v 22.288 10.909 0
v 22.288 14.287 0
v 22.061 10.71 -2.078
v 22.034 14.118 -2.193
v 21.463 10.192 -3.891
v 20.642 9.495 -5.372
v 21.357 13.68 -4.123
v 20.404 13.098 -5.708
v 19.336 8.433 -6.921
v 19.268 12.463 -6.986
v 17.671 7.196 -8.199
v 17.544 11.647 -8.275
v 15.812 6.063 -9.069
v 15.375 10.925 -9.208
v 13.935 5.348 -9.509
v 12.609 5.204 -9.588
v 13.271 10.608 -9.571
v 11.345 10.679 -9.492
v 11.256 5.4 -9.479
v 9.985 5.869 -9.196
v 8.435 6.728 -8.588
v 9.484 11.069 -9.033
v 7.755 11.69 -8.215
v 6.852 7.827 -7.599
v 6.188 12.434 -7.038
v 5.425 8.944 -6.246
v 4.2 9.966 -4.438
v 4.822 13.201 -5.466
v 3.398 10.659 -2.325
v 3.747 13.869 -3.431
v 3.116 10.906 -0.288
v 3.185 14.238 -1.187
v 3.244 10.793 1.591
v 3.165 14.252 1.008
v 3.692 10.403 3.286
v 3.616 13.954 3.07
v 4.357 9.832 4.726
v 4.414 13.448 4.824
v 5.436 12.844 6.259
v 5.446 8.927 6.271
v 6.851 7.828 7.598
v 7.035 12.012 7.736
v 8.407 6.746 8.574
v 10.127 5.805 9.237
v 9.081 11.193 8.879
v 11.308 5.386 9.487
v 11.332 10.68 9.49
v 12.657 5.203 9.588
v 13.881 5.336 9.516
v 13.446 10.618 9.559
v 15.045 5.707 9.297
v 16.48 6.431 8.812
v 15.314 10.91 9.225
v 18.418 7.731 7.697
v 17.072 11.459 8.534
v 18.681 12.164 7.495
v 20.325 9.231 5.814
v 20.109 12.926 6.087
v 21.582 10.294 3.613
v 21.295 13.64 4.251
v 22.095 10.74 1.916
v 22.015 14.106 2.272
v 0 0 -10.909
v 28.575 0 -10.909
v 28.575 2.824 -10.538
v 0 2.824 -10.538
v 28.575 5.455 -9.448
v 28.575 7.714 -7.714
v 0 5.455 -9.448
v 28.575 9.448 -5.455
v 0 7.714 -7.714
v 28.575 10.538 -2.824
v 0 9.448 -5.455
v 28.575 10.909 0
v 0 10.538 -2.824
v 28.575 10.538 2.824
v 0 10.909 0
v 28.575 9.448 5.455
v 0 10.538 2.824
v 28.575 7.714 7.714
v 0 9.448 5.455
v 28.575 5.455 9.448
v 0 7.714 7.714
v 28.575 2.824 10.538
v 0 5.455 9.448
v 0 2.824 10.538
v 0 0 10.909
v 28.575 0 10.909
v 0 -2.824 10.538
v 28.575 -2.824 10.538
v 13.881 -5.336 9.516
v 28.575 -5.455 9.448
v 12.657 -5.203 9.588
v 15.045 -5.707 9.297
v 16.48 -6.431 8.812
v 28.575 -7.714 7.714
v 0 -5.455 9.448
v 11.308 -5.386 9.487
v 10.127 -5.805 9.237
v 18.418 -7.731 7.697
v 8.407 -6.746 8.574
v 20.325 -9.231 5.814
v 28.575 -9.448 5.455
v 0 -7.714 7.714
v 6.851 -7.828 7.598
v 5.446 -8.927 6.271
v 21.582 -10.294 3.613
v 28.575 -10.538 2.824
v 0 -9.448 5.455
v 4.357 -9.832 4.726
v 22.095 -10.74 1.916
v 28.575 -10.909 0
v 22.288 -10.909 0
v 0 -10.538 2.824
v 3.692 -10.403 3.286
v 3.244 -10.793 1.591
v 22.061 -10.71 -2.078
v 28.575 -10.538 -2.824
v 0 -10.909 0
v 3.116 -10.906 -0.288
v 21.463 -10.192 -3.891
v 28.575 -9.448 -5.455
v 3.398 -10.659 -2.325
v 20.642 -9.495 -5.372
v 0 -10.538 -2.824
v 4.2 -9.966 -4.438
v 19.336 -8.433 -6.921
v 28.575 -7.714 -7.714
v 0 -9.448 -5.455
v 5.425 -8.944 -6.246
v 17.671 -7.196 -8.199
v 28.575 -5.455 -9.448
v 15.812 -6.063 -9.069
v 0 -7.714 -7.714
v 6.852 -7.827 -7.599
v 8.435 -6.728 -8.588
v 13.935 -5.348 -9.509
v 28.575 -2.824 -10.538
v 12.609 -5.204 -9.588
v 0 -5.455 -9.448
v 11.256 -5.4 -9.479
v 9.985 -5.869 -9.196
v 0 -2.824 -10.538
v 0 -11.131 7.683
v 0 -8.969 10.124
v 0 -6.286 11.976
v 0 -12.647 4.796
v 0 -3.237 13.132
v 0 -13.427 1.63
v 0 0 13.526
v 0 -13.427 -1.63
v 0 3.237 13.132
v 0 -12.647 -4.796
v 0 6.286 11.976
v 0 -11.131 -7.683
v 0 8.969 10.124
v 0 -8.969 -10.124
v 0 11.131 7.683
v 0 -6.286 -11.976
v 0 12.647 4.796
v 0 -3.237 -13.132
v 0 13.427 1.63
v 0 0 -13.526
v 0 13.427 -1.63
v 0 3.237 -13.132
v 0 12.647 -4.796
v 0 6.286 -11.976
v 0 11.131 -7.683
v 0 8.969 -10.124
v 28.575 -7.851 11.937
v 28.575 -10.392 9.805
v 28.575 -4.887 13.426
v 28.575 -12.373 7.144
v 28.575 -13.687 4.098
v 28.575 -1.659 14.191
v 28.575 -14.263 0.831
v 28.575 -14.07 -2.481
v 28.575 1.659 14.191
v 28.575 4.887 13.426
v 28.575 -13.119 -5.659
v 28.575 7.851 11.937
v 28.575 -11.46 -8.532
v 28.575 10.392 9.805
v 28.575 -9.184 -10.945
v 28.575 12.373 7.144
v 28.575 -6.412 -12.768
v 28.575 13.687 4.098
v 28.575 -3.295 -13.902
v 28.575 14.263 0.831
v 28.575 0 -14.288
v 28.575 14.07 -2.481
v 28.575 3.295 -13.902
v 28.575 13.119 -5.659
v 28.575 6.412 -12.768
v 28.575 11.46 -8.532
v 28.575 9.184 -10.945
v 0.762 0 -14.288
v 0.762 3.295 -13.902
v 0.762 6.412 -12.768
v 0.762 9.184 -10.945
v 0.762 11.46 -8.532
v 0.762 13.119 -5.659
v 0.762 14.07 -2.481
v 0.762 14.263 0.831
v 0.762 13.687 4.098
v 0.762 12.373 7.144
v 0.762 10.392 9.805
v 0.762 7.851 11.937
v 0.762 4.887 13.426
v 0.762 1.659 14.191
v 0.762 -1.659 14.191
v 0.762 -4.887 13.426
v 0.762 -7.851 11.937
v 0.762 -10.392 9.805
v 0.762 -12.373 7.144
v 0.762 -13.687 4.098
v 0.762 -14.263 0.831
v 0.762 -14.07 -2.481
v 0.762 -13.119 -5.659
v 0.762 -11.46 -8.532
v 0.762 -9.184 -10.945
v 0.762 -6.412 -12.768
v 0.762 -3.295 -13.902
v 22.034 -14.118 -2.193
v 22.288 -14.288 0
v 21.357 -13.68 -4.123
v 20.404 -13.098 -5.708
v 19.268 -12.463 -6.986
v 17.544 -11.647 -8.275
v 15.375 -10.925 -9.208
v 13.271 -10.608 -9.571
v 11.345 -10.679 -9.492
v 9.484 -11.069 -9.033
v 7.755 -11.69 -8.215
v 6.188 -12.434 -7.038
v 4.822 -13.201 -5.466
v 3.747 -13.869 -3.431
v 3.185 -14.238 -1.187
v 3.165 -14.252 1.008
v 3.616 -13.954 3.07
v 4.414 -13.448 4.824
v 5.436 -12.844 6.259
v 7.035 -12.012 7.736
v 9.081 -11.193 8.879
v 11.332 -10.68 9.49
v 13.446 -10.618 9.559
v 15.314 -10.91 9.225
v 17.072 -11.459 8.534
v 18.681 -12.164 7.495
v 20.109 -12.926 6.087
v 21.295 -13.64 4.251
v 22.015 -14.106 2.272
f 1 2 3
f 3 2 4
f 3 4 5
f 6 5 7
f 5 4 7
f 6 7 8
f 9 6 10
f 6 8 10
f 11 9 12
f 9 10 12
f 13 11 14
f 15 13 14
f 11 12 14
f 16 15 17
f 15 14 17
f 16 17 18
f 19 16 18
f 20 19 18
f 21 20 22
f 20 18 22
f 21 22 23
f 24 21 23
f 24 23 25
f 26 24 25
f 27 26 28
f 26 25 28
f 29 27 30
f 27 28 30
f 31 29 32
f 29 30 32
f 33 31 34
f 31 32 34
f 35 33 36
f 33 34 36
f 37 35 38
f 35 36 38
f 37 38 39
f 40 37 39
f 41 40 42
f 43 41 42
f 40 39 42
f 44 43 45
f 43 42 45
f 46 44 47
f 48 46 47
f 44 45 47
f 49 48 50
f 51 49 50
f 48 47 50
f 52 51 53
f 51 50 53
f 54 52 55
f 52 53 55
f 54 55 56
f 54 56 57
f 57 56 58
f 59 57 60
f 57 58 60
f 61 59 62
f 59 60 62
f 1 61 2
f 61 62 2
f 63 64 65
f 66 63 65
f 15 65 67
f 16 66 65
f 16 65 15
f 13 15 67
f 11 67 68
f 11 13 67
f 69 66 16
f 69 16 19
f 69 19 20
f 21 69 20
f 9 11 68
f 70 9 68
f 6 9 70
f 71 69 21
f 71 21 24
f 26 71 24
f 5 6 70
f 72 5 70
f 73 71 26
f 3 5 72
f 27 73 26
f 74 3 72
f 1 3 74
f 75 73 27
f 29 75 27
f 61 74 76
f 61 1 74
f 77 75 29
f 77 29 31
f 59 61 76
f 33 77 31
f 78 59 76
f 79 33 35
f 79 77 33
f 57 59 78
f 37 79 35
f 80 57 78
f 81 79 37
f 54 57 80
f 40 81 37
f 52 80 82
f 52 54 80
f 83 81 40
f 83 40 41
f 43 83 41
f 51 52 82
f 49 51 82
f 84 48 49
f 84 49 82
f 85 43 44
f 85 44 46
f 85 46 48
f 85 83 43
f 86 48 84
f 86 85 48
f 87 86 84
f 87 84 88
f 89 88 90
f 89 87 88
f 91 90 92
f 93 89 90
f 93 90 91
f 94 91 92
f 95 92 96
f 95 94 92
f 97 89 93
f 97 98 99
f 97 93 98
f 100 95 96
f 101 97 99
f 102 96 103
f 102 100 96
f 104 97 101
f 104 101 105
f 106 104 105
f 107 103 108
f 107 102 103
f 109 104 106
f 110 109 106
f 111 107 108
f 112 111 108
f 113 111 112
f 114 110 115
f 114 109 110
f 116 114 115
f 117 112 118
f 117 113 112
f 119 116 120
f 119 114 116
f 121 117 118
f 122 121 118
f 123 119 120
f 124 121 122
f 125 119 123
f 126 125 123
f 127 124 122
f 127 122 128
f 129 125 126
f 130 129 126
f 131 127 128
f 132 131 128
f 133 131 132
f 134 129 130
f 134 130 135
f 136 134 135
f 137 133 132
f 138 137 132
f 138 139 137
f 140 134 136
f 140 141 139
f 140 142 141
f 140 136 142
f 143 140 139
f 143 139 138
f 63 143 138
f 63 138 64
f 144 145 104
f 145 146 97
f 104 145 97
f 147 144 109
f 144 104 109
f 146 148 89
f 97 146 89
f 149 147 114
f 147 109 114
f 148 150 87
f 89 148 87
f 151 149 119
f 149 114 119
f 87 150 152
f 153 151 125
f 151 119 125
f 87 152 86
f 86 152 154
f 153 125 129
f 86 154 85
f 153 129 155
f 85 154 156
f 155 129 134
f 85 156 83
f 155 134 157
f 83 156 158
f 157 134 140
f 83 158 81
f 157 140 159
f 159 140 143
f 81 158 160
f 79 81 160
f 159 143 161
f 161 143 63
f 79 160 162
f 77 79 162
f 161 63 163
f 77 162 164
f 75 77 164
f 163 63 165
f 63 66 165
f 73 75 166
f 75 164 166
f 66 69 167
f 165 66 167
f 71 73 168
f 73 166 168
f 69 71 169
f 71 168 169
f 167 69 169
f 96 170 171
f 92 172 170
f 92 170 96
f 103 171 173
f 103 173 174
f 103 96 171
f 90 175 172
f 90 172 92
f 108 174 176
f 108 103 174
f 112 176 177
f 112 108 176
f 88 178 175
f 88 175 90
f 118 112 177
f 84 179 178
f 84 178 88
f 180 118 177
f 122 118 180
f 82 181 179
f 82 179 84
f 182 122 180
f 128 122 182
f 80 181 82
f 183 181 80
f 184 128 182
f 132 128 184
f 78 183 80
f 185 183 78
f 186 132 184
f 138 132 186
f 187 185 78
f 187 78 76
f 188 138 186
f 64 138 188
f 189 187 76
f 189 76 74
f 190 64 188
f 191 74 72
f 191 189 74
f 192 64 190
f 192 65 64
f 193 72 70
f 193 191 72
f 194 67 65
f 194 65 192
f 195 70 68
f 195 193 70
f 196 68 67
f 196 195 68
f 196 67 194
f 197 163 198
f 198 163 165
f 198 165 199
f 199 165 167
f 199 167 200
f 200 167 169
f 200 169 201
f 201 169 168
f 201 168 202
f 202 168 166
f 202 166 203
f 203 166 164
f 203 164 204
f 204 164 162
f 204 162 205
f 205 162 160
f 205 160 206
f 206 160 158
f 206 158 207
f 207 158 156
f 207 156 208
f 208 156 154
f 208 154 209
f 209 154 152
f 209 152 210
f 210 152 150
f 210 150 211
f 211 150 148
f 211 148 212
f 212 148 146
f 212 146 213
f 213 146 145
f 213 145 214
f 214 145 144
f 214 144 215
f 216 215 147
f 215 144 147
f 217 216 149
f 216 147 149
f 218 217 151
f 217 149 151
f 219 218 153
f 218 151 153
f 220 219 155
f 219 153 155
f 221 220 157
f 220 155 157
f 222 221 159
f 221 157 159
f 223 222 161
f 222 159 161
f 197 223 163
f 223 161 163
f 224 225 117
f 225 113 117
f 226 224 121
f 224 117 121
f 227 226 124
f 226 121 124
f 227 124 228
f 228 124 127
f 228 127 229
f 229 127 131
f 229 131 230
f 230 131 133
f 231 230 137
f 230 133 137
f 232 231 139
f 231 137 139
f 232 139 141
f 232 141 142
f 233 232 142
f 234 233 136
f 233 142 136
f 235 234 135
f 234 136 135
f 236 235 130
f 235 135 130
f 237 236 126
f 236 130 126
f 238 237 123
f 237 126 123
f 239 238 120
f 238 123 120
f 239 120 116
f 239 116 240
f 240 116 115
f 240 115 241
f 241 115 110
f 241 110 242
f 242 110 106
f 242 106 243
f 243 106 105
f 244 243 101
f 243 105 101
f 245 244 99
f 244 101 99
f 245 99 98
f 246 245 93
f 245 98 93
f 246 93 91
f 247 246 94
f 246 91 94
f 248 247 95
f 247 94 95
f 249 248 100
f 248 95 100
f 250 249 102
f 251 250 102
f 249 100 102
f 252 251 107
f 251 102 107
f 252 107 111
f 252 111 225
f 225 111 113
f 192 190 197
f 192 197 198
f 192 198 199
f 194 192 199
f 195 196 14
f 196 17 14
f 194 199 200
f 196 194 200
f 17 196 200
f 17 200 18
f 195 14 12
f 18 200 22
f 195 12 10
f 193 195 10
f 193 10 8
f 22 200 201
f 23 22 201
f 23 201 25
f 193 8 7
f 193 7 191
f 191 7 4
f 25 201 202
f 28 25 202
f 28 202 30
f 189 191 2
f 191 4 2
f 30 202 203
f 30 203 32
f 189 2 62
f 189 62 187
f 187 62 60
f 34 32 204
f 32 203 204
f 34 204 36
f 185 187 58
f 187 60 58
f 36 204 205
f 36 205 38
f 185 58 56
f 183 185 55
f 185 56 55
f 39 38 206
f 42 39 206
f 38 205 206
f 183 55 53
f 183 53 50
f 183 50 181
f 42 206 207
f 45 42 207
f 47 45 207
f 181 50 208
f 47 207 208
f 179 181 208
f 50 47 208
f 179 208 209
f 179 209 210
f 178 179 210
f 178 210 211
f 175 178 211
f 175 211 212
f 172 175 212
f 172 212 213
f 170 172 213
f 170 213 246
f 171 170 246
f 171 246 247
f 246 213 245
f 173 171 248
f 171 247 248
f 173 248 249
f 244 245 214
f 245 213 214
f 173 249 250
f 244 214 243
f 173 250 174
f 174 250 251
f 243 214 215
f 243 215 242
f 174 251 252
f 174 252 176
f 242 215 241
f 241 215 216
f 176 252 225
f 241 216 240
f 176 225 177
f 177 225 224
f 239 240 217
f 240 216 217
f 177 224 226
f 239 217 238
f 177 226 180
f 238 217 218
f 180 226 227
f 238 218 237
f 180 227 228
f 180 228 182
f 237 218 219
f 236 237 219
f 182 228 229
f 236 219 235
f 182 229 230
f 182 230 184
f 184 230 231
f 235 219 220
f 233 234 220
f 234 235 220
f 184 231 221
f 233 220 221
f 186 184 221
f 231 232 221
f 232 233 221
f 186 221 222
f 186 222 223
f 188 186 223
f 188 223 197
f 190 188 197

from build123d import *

# Parameters (mm, degrees)
SKETCH1_R           = 14.2875
SKETCH1_R_2         = 10.9093
BOSS_EXTRUDE1_DEPTH = 28.575
SKETCH2_R           = 9.5885
CUT_EXTRUDE1_DEPTH  = 19.05
CHAMFER1_SIZE       = 0.762


with BuildPart() as part:
    # Sketch1 → Boss-Extrude1 (new body)
    with BuildSketch(Plane(origin=(0, 0, 0), x_dir=(0, 0, -1), z_dir=(1, 0, 0))):
        Circle(SKETCH1_R)
        Circle(SKETCH1_R_2, mode=Mode.SUBTRACT)
    extrude(amount=BOSS_EXTRUDE1_DEPTH)

    # Sketch2 → Cut-Extrude1 (cut, symmetric)
    with BuildSketch(Plane(origin=(0, 0, 0), x_dir=(1, 0, 0), z_dir=(0, 1, 0))):
        with Locations((12.7, 0)):
            Circle(SKETCH2_R)
    extrude(amount=CUT_EXTRUDE1_DEPTH, both=True, mode=Mode.SUBTRACT)

    # Chamfer1
    chamfer1_edges = [part.edges().sort_by_distance(p)[0] for p in [
        (0, 0, 14.2875),
    ]]
    chamfer(chamfer1_edges, length=CHAMFER1_SIZE)


solid = part.part
